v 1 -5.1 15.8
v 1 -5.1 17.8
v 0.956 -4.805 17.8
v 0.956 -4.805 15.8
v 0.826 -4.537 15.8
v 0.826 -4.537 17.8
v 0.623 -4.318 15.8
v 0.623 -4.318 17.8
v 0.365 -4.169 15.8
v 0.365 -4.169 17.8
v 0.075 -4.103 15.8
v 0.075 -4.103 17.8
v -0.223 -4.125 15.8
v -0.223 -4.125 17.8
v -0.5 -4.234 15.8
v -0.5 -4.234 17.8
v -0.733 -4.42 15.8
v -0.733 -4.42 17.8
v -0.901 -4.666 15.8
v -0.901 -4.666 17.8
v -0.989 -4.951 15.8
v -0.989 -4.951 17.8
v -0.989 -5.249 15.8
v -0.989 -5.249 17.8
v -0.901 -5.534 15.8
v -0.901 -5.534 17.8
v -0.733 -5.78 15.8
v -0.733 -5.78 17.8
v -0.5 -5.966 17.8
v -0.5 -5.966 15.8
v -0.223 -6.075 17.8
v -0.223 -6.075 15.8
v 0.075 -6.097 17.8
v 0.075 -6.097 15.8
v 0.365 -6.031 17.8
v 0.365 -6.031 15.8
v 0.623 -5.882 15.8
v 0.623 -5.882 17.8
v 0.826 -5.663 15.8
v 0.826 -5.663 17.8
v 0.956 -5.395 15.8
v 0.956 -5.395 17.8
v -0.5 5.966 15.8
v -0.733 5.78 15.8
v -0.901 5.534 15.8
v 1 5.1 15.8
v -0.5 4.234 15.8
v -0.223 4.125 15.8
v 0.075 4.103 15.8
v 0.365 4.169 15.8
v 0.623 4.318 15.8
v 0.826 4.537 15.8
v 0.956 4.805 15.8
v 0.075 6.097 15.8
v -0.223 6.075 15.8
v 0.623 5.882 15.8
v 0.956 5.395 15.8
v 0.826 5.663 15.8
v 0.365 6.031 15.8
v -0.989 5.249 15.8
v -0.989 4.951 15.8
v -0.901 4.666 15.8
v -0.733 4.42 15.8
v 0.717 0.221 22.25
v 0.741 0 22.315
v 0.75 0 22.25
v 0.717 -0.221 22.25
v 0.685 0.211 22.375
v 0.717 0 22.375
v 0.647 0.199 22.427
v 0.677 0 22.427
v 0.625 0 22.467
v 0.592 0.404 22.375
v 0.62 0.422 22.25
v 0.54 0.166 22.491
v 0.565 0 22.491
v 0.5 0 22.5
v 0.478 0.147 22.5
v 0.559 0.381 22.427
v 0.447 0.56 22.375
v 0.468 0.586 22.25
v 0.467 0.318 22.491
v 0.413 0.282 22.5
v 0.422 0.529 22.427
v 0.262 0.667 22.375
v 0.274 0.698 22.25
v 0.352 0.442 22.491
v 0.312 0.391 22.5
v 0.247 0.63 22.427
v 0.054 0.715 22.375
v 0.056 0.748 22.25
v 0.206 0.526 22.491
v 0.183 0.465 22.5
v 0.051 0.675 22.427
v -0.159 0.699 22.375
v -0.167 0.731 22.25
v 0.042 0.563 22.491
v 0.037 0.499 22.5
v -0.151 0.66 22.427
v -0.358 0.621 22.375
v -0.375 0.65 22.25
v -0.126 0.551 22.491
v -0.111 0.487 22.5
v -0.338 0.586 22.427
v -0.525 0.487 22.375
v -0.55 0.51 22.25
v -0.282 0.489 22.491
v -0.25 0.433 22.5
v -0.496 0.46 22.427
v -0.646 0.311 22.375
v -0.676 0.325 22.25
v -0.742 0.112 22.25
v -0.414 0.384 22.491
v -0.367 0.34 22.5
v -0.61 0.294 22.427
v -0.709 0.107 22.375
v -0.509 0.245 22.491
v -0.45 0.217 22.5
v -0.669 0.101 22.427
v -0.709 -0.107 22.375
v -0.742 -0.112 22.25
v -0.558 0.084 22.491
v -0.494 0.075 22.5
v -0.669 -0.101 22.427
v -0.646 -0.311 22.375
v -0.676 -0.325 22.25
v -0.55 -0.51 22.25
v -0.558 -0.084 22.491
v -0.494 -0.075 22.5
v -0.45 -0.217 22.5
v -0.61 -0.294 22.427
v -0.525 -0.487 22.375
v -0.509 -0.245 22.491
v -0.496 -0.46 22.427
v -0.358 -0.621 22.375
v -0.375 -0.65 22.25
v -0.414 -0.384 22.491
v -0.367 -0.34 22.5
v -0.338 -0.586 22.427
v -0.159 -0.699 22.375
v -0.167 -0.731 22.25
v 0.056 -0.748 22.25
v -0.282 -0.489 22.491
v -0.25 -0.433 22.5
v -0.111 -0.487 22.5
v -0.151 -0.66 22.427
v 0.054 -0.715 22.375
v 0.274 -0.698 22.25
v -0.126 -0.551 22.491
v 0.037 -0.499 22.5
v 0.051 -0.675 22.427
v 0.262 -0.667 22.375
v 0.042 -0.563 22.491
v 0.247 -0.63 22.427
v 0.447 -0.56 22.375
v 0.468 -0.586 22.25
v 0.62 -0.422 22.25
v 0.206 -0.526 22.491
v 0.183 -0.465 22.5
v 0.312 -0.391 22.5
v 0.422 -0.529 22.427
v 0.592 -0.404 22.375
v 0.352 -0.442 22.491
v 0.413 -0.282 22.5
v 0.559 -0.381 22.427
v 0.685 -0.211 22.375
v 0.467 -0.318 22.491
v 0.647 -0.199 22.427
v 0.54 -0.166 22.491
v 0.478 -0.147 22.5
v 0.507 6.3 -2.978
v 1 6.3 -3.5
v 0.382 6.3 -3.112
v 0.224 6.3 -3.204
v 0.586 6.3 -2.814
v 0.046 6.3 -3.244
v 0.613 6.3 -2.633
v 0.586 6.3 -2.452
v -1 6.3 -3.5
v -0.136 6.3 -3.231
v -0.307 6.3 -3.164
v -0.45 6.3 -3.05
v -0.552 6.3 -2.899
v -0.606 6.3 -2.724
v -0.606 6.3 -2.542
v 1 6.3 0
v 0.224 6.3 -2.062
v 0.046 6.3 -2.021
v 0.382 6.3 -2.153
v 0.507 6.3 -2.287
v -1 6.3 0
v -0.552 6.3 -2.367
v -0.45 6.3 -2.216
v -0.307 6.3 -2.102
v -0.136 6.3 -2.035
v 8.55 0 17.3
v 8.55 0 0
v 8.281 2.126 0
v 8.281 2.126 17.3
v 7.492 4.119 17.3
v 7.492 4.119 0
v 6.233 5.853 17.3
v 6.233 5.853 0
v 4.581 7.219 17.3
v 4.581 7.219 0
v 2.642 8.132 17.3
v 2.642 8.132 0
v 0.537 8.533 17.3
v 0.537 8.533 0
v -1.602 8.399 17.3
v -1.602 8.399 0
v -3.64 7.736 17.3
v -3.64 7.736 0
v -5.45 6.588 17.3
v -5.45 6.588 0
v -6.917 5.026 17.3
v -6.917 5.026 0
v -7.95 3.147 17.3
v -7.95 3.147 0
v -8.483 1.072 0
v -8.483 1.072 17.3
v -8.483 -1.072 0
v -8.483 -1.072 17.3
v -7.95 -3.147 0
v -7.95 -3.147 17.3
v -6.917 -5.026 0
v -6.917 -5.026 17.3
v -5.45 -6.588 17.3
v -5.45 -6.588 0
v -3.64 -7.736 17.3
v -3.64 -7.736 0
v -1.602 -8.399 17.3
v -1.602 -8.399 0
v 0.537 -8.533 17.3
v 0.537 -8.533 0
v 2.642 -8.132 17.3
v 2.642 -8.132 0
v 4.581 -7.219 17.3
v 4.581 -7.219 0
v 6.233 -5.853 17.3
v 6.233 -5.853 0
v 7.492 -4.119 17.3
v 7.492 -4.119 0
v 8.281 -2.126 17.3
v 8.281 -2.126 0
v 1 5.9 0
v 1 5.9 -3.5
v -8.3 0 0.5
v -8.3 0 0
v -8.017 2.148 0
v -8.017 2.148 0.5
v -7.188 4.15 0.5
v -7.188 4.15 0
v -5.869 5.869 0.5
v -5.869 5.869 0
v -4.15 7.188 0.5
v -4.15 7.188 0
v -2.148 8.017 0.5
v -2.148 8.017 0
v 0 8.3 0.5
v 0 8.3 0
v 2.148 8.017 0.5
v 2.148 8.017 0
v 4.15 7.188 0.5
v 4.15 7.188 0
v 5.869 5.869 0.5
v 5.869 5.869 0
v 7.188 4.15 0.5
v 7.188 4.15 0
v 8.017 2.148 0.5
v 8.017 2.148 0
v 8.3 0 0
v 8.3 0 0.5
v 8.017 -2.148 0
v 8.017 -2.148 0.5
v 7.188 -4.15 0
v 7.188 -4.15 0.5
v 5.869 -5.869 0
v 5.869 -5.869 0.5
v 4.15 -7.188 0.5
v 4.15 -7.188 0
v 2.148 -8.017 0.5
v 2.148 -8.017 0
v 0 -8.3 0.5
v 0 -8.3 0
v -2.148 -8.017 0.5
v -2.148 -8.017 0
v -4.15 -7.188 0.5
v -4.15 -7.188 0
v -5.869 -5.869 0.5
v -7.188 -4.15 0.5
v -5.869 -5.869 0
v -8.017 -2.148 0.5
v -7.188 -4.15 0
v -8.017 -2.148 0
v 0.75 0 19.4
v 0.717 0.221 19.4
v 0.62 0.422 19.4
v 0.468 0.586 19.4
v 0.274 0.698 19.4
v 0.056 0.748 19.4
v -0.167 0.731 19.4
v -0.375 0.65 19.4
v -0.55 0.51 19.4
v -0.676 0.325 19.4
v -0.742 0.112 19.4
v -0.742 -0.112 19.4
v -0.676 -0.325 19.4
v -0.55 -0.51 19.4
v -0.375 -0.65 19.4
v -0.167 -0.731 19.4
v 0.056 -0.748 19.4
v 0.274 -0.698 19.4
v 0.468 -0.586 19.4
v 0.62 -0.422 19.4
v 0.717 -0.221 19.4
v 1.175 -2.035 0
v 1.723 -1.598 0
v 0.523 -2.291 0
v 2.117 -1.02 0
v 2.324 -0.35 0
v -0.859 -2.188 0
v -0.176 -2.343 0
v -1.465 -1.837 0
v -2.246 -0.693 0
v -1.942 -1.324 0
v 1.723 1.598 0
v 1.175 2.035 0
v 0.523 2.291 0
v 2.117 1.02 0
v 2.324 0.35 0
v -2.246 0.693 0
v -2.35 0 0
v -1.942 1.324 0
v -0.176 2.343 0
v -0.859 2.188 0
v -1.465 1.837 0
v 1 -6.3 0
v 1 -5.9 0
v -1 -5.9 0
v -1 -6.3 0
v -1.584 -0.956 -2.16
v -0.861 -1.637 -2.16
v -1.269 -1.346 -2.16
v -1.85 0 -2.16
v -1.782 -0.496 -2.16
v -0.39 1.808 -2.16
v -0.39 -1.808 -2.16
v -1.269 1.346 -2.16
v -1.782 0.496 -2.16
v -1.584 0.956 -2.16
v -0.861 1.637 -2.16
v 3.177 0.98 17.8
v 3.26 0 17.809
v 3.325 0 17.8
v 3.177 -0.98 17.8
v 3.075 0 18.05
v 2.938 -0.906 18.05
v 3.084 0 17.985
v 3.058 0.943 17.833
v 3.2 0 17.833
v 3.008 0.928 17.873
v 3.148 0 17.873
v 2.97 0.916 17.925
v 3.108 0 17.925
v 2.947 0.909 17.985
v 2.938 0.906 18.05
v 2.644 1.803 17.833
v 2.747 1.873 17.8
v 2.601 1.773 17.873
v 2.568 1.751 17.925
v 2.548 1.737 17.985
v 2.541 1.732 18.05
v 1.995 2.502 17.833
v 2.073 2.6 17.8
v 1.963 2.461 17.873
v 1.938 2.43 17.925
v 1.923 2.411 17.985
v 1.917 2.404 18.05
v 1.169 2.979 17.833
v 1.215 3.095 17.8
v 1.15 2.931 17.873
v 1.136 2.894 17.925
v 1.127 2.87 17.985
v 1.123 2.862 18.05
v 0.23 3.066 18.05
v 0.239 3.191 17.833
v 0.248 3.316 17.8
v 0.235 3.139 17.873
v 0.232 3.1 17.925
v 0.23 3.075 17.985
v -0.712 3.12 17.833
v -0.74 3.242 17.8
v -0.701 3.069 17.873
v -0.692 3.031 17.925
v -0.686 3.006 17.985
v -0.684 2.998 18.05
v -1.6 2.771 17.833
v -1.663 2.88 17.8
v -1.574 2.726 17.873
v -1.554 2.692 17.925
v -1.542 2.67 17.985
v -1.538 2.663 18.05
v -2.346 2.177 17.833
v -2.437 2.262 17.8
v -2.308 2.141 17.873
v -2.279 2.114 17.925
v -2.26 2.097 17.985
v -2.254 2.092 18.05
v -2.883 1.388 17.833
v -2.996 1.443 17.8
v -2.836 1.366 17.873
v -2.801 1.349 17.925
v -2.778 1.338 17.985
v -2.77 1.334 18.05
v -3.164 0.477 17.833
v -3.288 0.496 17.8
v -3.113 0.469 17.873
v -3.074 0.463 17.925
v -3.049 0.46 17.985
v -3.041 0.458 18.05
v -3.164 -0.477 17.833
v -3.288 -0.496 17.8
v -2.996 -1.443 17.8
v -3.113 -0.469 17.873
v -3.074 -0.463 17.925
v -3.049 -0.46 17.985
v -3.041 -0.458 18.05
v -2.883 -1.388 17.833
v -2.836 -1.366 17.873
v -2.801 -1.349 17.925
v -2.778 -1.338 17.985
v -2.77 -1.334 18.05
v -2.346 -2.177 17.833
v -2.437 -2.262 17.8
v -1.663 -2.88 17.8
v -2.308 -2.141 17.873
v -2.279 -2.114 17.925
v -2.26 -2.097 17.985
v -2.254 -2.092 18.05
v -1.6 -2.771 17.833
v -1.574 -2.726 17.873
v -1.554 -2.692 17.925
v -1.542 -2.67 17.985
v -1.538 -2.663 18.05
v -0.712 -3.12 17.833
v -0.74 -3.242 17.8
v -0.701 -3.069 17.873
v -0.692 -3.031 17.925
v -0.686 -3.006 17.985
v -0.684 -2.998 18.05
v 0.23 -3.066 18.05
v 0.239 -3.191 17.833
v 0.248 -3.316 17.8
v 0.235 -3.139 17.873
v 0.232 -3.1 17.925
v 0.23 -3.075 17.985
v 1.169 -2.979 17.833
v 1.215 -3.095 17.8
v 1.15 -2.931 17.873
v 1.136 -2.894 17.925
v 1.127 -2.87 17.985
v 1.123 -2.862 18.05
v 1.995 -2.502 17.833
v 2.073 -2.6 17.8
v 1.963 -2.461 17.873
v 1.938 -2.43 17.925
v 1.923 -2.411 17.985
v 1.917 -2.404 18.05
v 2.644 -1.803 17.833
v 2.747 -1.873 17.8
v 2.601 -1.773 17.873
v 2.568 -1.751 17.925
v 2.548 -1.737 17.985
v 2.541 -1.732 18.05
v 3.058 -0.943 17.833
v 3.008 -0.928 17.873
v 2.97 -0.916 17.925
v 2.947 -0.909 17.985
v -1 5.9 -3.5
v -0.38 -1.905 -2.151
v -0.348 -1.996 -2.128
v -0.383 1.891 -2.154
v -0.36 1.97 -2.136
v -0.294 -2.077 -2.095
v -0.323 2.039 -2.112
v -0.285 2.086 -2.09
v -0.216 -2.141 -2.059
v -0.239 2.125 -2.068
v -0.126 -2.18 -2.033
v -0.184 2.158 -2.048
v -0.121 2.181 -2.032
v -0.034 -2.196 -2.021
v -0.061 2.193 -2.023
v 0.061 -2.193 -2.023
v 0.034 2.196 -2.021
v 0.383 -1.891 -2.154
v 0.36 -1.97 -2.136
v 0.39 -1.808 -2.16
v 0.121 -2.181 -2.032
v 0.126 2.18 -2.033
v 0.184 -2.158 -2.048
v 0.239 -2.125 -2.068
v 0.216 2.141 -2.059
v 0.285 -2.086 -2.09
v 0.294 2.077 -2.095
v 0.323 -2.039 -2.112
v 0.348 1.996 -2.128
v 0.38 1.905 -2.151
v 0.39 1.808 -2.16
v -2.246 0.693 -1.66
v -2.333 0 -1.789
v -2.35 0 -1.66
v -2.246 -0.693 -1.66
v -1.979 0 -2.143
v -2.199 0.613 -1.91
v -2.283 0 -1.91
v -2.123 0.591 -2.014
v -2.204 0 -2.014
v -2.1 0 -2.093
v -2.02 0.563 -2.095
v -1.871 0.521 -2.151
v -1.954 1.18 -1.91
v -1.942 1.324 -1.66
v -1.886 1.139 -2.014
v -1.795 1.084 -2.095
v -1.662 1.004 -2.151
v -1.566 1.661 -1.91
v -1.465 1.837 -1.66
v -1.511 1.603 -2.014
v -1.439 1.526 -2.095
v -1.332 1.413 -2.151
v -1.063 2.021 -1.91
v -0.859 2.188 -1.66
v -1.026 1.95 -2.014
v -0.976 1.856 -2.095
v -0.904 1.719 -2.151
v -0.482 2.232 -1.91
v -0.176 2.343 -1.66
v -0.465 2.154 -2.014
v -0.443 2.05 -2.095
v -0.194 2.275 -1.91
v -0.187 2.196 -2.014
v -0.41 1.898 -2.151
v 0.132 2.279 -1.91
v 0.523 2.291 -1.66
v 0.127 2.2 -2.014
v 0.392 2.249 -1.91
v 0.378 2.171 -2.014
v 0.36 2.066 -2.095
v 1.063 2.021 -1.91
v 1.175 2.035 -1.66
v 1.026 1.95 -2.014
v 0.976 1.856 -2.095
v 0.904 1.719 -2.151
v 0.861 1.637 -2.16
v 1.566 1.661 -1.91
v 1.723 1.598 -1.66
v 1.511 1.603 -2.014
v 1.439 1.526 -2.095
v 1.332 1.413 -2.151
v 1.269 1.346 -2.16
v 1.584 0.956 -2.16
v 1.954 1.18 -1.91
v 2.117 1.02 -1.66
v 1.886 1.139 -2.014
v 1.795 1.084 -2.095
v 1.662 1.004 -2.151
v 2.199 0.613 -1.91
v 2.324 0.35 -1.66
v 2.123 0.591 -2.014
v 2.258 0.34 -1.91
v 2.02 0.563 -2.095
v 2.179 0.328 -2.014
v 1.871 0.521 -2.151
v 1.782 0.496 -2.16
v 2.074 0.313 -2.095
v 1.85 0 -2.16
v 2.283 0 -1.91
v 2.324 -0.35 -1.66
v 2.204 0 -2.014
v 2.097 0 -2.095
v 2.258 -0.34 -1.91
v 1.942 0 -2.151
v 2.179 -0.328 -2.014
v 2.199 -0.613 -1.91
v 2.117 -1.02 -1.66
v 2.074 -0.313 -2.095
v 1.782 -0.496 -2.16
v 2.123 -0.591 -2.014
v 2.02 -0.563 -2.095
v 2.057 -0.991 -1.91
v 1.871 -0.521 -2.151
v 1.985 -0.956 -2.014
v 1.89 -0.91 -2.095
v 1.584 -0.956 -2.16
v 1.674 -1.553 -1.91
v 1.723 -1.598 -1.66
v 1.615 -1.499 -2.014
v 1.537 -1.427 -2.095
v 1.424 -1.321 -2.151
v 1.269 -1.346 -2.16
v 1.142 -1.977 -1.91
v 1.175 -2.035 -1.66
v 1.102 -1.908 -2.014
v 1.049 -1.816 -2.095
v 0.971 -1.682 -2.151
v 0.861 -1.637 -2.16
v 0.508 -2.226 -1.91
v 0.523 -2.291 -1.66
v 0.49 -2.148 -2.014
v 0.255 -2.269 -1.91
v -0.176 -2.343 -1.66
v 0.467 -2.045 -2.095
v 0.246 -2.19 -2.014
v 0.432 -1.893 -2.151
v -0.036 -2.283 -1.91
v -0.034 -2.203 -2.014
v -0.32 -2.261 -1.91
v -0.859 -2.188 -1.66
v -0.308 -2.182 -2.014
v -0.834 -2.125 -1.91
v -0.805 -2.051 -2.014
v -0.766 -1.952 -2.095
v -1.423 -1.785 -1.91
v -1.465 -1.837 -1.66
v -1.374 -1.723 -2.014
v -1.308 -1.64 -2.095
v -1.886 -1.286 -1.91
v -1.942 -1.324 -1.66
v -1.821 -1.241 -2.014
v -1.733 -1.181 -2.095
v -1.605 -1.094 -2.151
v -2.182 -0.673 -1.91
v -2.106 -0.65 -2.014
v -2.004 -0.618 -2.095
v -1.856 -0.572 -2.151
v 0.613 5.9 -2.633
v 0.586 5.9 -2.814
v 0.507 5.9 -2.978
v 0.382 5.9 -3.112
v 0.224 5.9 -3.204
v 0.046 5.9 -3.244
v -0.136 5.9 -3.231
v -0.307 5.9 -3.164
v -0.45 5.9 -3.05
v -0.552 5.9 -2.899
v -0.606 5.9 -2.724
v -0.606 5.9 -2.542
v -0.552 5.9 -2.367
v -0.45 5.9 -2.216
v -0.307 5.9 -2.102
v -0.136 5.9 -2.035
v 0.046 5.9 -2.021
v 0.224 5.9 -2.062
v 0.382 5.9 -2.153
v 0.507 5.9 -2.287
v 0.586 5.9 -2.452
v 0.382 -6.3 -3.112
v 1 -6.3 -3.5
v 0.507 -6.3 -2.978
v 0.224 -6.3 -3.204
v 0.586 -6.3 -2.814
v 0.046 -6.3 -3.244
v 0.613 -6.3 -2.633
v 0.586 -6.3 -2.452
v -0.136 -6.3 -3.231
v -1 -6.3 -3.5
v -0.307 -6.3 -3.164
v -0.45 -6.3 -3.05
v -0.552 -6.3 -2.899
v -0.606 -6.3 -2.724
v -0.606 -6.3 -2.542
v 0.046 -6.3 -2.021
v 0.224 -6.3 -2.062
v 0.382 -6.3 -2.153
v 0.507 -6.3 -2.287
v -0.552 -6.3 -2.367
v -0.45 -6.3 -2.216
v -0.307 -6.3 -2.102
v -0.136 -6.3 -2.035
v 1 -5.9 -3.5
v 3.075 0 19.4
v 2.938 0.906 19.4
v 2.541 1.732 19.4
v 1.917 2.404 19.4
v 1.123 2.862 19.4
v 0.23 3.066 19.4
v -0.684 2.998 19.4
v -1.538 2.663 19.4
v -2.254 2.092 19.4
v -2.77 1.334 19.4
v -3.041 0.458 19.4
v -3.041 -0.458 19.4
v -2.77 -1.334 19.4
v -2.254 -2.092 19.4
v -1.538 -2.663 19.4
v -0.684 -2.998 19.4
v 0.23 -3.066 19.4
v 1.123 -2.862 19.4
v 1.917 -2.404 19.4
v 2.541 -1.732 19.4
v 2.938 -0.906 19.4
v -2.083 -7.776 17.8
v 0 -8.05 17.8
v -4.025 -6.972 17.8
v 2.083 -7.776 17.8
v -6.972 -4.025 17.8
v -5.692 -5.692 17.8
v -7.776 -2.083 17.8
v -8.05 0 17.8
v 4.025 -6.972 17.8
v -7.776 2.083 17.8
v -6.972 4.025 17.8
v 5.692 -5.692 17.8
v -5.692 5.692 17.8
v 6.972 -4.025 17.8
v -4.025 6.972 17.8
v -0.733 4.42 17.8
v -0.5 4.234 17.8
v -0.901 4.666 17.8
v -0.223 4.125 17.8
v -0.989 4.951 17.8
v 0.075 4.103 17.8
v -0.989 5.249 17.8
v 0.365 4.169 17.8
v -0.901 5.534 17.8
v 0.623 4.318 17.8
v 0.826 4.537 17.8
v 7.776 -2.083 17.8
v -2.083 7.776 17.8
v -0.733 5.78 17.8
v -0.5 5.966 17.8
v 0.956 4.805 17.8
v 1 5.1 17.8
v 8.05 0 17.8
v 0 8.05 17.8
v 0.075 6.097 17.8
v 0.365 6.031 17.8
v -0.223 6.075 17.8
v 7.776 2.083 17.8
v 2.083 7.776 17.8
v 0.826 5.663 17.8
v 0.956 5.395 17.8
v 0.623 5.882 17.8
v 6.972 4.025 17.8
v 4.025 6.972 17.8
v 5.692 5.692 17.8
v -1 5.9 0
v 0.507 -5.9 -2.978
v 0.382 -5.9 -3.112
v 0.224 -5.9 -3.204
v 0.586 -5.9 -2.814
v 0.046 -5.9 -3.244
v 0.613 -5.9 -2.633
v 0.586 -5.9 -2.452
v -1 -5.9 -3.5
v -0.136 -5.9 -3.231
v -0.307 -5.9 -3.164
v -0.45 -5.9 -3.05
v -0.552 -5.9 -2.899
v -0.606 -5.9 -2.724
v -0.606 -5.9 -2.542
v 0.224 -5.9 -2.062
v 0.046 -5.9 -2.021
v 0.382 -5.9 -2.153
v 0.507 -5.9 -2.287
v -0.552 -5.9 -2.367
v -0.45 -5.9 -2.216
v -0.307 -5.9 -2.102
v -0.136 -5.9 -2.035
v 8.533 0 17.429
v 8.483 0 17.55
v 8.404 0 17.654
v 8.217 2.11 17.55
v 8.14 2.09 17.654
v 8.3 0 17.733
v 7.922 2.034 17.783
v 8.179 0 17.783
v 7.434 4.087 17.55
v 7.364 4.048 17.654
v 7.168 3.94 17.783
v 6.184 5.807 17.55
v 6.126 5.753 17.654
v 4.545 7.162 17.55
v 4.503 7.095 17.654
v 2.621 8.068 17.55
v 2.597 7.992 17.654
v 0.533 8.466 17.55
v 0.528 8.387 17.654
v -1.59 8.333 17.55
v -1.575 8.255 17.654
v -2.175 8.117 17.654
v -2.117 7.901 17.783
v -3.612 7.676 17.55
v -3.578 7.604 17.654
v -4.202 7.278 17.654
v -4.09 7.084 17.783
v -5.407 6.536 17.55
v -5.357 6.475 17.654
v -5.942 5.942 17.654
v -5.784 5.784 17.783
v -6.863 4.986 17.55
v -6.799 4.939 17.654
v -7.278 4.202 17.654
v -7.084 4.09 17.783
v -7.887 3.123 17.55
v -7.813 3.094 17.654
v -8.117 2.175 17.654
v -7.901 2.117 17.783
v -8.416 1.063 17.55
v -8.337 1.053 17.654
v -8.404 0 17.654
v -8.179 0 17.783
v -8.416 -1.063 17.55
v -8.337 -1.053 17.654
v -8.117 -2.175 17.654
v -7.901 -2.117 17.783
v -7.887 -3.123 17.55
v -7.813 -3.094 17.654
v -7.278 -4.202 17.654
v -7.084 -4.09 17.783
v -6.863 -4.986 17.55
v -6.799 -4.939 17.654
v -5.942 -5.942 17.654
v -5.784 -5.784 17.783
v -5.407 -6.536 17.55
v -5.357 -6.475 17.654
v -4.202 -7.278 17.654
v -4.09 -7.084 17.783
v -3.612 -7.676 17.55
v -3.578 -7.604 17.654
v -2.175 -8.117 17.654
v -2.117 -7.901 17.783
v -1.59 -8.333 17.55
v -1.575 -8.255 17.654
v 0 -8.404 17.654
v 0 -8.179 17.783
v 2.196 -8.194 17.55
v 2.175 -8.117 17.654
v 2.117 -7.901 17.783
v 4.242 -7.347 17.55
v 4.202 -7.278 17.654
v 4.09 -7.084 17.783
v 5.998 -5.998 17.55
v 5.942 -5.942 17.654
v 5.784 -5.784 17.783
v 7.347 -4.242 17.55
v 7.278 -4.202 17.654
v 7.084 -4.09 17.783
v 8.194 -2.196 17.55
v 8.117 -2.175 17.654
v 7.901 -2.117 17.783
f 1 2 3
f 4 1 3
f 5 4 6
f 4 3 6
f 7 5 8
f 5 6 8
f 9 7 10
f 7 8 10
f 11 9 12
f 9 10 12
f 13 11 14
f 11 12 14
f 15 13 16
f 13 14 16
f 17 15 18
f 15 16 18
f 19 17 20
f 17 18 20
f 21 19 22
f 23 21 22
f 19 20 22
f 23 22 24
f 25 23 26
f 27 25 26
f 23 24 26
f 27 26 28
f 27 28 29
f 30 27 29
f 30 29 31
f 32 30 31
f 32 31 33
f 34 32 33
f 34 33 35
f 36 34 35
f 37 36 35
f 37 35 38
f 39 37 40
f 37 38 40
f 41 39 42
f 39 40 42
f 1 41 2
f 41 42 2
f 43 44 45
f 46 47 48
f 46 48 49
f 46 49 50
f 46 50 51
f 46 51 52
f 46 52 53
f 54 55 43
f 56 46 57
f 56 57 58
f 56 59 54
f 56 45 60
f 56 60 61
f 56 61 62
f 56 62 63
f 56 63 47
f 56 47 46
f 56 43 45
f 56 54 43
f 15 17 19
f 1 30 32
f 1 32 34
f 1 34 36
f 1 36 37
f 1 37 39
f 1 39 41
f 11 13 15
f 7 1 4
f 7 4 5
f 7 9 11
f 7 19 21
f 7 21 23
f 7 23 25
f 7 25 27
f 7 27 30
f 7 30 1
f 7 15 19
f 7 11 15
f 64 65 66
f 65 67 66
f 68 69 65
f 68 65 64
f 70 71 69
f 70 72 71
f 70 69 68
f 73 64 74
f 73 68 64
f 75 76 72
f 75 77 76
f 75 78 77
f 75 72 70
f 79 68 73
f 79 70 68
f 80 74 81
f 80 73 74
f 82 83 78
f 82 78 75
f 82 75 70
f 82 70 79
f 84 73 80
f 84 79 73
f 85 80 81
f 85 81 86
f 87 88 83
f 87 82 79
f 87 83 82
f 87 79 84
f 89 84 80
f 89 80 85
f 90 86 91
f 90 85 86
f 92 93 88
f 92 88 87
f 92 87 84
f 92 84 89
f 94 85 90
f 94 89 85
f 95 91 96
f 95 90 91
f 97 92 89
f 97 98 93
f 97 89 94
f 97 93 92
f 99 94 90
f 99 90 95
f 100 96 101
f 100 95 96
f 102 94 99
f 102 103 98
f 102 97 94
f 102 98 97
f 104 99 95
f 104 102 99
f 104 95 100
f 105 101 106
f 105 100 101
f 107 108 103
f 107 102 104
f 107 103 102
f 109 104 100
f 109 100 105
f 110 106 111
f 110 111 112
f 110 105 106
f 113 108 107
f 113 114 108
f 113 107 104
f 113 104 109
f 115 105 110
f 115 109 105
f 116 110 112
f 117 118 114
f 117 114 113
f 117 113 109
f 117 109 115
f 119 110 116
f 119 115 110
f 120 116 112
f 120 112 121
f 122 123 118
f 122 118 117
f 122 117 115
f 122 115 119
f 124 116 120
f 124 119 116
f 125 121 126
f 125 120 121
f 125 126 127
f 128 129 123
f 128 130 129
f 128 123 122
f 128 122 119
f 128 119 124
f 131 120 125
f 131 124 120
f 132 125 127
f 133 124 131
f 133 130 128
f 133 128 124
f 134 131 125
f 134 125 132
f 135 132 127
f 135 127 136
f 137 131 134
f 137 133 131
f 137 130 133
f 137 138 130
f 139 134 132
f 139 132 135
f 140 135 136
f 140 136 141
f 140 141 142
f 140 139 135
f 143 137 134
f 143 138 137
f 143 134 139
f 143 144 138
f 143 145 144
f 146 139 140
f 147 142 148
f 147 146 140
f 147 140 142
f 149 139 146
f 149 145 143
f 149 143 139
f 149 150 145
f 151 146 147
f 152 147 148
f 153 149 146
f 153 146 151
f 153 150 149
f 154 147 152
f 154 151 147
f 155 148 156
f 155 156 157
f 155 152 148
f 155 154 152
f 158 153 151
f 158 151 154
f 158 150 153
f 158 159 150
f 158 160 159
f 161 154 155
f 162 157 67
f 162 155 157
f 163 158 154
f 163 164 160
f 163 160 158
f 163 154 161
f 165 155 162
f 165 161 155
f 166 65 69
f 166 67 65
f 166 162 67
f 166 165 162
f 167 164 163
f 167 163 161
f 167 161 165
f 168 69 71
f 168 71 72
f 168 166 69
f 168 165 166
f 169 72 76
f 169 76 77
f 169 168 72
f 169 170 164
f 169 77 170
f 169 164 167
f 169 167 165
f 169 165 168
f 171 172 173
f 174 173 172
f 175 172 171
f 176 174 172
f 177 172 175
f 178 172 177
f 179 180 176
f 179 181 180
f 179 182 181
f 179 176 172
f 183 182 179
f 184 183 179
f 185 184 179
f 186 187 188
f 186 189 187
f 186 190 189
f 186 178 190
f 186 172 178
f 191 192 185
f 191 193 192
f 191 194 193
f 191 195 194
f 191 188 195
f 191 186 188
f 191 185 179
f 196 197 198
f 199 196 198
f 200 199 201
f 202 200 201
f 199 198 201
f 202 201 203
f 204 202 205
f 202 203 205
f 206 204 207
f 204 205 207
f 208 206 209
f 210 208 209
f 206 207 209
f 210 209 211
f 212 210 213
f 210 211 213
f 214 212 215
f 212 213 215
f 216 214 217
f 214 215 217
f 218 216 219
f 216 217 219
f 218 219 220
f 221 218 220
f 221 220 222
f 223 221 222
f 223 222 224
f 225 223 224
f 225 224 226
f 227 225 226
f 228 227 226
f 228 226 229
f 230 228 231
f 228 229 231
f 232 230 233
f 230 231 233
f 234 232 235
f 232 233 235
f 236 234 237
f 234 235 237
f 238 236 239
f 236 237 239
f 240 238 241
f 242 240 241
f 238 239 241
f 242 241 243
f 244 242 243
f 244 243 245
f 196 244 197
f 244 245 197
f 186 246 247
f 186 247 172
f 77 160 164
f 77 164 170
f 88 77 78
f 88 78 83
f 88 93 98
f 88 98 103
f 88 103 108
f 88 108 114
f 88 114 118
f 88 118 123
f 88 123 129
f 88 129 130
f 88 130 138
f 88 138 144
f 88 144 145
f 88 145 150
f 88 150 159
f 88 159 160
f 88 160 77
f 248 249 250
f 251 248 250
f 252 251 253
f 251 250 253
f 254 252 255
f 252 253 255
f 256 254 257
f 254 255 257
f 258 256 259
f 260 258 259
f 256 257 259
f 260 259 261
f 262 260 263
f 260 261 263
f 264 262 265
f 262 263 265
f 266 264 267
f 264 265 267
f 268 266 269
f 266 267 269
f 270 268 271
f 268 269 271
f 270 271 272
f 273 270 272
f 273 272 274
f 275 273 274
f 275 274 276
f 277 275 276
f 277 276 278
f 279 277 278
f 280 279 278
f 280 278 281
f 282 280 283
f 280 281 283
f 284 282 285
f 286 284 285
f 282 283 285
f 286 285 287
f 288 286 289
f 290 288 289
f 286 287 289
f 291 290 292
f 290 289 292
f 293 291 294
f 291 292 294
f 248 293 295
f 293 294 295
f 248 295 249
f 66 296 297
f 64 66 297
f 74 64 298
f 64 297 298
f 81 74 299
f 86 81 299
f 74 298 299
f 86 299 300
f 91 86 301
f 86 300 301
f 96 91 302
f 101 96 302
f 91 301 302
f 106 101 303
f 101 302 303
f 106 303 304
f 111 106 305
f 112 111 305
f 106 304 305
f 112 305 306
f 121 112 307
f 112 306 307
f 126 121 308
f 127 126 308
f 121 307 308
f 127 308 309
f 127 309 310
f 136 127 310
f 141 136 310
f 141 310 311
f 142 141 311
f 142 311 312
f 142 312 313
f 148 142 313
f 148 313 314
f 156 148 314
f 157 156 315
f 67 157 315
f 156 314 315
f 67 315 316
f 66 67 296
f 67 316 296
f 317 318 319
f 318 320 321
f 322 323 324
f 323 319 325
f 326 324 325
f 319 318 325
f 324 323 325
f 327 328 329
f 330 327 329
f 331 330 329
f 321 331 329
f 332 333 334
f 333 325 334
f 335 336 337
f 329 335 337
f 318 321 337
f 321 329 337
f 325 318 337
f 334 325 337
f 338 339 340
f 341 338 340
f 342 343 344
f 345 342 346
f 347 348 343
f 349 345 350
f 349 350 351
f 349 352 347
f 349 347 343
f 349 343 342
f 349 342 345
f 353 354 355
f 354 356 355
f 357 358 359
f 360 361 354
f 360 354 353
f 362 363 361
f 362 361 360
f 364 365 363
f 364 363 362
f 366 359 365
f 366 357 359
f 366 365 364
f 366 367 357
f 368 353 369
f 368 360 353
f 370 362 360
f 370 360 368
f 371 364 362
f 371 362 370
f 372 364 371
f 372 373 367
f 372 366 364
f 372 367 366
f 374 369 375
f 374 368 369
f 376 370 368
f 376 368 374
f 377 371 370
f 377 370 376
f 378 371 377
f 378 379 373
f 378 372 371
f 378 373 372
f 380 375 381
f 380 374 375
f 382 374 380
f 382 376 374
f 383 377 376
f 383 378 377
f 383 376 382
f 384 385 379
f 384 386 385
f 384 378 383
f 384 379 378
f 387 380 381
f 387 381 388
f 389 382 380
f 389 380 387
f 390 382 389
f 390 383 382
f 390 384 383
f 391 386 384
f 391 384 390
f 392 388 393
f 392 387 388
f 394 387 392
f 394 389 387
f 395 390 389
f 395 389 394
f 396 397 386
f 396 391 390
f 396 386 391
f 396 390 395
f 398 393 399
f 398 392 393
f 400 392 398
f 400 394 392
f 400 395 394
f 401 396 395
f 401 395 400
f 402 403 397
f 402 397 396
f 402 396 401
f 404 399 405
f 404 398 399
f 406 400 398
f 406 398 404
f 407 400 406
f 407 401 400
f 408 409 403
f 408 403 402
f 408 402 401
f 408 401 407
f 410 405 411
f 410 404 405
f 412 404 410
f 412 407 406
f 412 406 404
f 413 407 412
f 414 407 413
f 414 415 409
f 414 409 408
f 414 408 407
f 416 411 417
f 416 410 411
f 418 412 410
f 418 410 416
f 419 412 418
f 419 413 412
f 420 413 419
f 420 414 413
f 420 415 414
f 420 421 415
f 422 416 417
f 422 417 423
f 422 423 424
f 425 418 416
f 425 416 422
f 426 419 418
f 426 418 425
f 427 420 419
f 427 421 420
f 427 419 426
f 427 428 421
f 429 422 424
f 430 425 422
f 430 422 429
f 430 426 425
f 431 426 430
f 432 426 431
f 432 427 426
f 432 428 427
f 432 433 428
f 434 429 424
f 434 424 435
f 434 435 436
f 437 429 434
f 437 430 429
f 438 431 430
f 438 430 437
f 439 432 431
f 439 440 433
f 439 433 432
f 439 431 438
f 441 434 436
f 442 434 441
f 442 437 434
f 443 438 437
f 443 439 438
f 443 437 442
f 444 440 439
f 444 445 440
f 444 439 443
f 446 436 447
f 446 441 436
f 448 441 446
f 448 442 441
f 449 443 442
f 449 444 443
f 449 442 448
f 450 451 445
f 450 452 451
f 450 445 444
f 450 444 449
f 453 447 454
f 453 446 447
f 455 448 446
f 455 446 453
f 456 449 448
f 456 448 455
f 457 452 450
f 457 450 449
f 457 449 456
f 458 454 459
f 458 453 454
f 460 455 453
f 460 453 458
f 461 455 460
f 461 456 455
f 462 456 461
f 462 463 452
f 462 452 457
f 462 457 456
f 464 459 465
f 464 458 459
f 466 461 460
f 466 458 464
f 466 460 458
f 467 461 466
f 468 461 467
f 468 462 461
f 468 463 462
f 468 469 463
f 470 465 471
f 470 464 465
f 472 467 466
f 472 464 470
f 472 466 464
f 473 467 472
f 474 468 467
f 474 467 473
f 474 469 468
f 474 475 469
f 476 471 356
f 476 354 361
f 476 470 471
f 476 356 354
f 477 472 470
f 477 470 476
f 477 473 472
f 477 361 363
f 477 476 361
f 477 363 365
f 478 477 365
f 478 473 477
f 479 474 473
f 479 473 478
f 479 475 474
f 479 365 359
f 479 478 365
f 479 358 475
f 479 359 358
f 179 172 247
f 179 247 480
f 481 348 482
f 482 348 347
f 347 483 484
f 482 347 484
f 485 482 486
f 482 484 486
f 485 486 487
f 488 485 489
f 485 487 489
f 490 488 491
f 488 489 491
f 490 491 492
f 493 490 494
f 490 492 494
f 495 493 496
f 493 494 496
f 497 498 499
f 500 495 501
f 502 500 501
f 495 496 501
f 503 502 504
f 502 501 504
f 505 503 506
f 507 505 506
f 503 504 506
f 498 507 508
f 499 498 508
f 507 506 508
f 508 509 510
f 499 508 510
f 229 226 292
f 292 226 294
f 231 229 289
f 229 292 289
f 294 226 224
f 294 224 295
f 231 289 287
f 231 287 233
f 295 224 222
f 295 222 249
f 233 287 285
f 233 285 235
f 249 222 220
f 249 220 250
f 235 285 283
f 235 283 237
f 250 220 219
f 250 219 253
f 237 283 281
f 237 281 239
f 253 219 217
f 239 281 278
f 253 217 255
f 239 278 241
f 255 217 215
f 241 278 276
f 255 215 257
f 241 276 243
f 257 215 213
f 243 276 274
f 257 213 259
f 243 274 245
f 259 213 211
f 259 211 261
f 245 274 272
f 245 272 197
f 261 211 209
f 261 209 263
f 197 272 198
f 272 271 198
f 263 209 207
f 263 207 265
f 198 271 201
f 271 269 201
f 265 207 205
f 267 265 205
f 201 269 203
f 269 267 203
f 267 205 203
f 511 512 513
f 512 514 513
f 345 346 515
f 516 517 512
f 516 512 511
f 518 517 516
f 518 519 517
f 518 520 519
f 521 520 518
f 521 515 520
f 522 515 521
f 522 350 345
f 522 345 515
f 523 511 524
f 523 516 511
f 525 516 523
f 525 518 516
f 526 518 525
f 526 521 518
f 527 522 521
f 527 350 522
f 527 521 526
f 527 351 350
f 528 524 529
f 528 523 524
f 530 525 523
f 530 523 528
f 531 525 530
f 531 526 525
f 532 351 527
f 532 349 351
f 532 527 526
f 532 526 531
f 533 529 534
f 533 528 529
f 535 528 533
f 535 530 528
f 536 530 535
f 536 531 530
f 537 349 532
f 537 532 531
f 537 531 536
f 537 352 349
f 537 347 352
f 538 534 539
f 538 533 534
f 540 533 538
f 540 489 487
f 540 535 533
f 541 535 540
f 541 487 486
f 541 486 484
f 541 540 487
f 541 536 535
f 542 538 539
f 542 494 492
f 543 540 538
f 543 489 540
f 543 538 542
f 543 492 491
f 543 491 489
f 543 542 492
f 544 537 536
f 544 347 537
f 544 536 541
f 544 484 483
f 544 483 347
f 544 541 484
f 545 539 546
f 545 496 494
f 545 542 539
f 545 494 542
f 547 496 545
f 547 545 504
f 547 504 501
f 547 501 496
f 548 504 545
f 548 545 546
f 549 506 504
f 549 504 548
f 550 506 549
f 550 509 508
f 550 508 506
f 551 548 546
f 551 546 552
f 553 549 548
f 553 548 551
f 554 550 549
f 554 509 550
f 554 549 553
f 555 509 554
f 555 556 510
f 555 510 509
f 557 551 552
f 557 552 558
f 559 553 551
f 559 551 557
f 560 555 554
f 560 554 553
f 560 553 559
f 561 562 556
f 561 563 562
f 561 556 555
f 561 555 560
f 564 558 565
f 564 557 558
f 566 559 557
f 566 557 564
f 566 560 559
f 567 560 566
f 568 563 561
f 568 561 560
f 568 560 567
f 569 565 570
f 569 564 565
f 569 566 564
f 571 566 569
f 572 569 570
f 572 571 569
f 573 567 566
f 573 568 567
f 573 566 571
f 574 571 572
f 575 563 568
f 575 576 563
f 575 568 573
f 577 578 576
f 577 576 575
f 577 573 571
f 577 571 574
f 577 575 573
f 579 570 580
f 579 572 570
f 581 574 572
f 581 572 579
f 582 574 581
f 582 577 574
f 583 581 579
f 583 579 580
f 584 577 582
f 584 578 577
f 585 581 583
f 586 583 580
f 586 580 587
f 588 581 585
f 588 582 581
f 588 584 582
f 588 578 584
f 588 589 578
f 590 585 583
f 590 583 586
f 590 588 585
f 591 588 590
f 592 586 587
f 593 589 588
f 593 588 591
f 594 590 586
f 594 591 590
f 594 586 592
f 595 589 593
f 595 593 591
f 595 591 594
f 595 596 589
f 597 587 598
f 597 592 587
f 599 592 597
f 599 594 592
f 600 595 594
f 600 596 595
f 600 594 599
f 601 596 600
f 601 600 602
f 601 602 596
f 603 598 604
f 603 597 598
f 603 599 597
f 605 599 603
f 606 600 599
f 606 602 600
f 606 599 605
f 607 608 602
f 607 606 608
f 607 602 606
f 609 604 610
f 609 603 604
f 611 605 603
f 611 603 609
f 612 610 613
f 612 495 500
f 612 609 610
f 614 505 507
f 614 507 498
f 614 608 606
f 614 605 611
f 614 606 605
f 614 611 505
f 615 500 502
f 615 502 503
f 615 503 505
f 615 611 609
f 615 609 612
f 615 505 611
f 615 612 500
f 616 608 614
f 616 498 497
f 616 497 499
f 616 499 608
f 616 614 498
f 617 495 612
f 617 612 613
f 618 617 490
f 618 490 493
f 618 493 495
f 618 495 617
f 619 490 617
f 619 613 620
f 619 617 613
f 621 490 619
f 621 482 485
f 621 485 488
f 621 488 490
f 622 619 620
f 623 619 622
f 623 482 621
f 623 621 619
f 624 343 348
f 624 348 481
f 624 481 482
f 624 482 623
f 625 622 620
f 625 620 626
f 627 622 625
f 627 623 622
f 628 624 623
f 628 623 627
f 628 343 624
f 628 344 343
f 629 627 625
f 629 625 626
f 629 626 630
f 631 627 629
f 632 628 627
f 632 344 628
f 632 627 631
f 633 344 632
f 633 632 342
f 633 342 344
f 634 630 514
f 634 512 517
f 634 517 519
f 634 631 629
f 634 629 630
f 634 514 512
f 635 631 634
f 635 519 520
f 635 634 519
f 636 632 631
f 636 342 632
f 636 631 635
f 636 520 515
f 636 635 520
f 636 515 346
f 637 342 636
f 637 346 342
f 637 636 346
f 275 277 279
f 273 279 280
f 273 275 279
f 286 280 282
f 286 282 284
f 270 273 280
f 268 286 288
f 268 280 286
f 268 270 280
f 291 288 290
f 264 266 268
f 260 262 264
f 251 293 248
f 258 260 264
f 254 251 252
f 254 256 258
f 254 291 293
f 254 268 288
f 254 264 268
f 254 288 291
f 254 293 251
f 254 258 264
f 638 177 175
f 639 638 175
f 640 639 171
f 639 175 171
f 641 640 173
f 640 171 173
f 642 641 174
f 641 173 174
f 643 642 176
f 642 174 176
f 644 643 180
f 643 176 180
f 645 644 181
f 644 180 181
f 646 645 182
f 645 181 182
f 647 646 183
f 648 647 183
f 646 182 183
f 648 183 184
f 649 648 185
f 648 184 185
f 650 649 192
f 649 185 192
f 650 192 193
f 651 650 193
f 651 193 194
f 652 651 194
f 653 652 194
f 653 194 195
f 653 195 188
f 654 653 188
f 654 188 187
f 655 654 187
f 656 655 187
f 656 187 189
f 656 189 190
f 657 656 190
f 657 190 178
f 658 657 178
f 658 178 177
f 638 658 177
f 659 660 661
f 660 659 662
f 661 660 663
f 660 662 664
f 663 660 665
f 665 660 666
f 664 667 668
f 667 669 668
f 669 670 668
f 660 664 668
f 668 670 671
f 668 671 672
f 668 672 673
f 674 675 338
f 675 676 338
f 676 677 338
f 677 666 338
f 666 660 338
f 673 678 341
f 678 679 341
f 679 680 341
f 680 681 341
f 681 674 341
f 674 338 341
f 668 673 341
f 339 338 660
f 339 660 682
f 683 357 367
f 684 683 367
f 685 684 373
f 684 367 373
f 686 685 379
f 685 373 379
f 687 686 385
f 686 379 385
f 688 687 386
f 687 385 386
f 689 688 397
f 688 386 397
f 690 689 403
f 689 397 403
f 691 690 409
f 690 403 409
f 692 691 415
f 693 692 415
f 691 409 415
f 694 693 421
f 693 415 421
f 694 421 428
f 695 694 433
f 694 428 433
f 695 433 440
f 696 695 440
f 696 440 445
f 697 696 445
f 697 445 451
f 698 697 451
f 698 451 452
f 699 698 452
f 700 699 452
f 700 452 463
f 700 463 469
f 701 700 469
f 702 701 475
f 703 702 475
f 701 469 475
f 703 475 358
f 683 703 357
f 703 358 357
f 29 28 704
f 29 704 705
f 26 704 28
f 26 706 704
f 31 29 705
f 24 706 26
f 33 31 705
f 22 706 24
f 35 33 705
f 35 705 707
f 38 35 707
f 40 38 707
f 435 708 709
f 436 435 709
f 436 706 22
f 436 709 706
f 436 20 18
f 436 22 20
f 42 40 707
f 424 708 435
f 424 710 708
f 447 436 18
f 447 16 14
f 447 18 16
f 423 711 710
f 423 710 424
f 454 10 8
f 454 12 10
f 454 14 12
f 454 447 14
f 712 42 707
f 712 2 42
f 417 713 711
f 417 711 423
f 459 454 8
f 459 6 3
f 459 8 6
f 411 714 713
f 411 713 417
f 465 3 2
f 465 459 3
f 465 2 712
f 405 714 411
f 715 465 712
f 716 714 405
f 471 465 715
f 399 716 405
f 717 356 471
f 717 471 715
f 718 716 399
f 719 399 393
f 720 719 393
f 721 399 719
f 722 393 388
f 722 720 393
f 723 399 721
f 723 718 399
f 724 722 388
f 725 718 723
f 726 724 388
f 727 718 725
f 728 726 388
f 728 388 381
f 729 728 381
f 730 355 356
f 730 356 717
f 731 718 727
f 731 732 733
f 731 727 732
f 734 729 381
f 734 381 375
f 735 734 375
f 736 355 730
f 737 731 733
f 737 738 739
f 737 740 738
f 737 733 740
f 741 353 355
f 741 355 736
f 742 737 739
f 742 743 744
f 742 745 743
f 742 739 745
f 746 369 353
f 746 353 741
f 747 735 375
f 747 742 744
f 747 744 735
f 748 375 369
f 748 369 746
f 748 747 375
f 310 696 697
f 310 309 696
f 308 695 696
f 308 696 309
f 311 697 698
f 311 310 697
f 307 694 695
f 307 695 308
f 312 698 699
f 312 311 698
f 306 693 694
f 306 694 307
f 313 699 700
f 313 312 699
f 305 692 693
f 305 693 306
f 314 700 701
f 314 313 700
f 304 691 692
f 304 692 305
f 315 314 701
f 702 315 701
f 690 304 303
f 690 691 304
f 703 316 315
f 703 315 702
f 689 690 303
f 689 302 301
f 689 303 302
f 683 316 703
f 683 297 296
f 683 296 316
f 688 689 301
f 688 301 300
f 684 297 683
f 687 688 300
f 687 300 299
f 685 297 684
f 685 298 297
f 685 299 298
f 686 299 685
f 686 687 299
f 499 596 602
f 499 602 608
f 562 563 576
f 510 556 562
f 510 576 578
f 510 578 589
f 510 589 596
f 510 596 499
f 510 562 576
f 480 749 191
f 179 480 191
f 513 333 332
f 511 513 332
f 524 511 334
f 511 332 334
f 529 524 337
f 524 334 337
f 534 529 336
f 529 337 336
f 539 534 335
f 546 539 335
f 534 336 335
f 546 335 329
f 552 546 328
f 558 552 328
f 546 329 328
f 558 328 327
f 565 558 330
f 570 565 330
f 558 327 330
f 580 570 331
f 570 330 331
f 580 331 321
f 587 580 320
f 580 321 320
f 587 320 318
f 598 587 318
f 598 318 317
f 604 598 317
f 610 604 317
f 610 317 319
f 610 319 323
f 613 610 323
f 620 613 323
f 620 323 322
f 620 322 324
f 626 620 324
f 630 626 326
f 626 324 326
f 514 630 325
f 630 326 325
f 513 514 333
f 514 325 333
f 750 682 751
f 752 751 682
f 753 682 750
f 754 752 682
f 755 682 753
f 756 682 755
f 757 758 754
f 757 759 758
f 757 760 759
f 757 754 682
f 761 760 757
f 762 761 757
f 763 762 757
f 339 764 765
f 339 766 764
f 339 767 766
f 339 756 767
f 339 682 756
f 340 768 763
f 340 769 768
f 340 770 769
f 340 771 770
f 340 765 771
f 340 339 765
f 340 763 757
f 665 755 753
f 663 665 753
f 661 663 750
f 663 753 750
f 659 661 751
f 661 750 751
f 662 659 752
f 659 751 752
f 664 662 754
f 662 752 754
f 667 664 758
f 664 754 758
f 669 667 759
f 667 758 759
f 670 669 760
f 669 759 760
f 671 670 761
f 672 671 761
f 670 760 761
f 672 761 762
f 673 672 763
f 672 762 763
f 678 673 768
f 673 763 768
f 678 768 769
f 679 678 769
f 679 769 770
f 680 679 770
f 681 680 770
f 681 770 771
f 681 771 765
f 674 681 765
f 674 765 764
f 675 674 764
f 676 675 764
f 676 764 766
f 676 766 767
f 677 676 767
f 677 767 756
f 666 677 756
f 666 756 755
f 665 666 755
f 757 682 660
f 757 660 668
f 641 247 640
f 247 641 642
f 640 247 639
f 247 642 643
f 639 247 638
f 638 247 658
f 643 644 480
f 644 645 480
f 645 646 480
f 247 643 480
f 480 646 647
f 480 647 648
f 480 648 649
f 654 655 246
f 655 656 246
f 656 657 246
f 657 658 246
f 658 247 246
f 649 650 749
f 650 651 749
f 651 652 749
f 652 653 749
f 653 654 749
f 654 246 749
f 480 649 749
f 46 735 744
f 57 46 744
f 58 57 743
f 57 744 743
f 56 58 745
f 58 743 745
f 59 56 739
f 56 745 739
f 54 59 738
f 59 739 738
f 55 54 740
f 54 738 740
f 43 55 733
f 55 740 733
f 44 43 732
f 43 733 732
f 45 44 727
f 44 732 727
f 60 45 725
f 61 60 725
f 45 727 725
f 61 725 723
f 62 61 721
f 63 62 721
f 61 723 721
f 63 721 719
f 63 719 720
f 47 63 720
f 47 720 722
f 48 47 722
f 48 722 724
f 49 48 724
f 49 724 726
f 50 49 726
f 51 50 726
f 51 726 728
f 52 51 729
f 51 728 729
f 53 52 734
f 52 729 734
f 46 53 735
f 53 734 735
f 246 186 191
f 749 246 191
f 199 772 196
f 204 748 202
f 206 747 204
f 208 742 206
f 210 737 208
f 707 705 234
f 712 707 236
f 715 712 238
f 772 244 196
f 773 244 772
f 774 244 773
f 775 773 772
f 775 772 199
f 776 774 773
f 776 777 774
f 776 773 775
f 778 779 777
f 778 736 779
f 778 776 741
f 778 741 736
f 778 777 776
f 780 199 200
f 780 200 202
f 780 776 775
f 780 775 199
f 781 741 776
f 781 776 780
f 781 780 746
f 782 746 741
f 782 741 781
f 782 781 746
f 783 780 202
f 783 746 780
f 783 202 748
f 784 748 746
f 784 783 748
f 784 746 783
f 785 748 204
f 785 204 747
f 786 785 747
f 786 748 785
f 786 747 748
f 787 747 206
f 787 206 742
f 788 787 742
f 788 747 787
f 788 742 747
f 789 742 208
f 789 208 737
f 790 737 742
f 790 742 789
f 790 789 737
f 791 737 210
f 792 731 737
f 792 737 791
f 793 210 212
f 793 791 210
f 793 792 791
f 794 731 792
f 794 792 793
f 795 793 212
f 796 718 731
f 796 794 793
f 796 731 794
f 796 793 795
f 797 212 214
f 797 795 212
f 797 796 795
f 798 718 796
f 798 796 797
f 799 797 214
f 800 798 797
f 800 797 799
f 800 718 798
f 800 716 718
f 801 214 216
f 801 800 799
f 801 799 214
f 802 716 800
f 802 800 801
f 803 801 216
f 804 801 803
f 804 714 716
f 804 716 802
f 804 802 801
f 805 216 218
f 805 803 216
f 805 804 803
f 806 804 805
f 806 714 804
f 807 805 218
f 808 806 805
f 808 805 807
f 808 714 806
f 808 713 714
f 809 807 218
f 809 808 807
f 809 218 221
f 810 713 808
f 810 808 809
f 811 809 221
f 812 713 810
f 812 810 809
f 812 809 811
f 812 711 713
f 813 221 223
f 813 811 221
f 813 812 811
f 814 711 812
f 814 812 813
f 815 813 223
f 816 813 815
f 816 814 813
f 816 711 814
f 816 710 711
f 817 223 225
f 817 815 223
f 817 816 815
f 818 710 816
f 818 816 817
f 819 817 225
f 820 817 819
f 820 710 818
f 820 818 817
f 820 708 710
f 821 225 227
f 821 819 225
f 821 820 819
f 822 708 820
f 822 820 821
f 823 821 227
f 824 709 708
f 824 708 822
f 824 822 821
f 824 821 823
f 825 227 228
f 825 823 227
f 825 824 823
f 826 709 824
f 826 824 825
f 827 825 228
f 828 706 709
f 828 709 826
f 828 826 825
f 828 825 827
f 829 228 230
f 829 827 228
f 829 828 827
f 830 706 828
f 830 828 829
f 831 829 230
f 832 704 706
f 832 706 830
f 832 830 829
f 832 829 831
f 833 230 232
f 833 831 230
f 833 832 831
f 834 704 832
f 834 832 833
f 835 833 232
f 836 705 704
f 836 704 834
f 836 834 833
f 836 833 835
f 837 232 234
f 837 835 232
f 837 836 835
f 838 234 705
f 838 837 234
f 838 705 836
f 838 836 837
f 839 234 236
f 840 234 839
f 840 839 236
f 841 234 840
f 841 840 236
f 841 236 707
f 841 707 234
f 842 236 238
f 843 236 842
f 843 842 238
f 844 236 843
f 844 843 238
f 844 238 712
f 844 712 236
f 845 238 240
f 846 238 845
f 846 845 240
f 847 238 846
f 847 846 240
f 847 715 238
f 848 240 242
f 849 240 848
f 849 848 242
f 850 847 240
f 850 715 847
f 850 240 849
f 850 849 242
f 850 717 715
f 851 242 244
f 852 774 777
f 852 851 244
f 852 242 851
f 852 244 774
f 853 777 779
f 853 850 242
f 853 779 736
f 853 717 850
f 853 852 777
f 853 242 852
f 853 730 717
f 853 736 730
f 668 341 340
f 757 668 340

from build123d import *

# Parameters (mm, degrees)
SKETCH1_R           = 8.55
BOSS_EXTRUDE1_DEPTH = 17.8
SKETCH2_R           = 3.075
BOSS_EXTRUDE2_DEPTH = 1.6
SKETCH3_R           = 0.75
BOSS_EXTRUDE3_DEPTH = 3.1
SKETCH4_R           = 1
CUT_EXTRUDE1_DEPTH  = 2
SKETCH5_R           = 2.35
BOSS_EXTRUDE4_DEPTH = 2.16
SKETCH6_W           = 2
SKETCH6_H           = 0.4
BOSS_EXTRUDE5_DEPTH = 3.5
FILLET1_R           = 0.5
FILLET2_R           = 0.25
FILLET3_R           = 0.5
SKETCH7_R           = 8.3
CUT_EXTRUDE2_DEPTH  = 0.5
SKETCH8_R           = 0.613220663
CUT_EXTRUDE3_DEPTH  = 15.5
FILLET4_R           = 0.25


with BuildPart() as part:
    # Sketch1 → Boss-Extrude1 (new body)
    with BuildSketch(Plane.XY):
        Circle(SKETCH1_R)
    extrude(amount=BOSS_EXTRUDE1_DEPTH)

    # Sketch2 → Boss-Extrude2 (add)
    with BuildSketch(Plane.XY.offset(17.8)):
        Circle(SKETCH2_R)
    extrude(amount=BOSS_EXTRUDE2_DEPTH)

    # Sketch3 → Boss-Extrude3 (add)
    with BuildSketch(Plane.XY.offset(19.4)):
        Circle(SKETCH3_R)
    extrude(amount=BOSS_EXTRUDE3_DEPTH)

    # Sketch4 → Cut-Extrude1 (cut)
    with BuildSketch(Plane.XY.offset(17.8)):
        with Locations((0, 5.1)):
            Circle(SKETCH4_R)
        with Locations((0, -5.1)):
            Circle(SKETCH4_R)
    extrude(amount=-CUT_EXTRUDE1_DEPTH, mode=Mode.SUBTRACT)

    # Sketch5 → Boss-Extrude4 (add)
    with BuildSketch(Plane(origin=(0, 0, 0), x_dir=(-1, 0, 0), z_dir=(0, 0, -1))):
        Circle(SKETCH5_R)
    extrude(amount=BOSS_EXTRUDE4_DEPTH)

    # Sketch6 → Boss-Extrude5 (add)
    with BuildSketch(Plane(origin=(0, 0, 0), x_dir=(-1, 0, 0), z_dir=(0, 0, -1))):
        with Locations((0, 6.1)):
            Rectangle(SKETCH6_W, SKETCH6_H)
        with Locations((0, -6.1)):
            Rectangle(SKETCH6_W, SKETCH6_H)
    extrude(amount=BOSS_EXTRUDE5_DEPTH)

    # Fillet1
    fillet1_edges = [part.edges().sort_by_distance(p)[0] for p in [
        (-8.55, 0, 17.8),
    ]]
    fillet(fillet1_edges, radius=FILLET1_R)

    # Fillet2
    fillet2_edges = [part.edges().sort_by_distance(p)[0] for p in [
        (-3.075, 0, 17.8),
    ]]
    fillet(fillet2_edges, radius=FILLET2_R)

    # Fillet3
    fillet3_edges = [part.edges().sort_by_distance(p)[0] for p in [
        (2.35, 0, -2.16),
    ]]
    fillet(fillet3_edges, radius=FILLET3_R)

    # Sketch7 → Cut-Extrude2 (cut)
    with BuildSketch(Plane(origin=(0, 0, 0), x_dir=(-1, 0, 0), z_dir=(0, 0, -1))):
        Circle(SKETCH7_R)
    extrude(amount=-CUT_EXTRUDE2_DEPTH, mode=Mode.SUBTRACT)

    # Sketch8 → Cut-Extrude3 (cut)
    with BuildSketch(Plane(origin=(0, 6.3, 0), x_dir=(1, 0, 0), z_dir=(0, 1, 0))):
        with Locations((0, 2.632929707)):
            Circle(SKETCH8_R)
    extrude(amount=-CUT_EXTRUDE3_DEPTH, mode=Mode.SUBTRACT)

    # Fillet4
    fillet4_edges = [part.edges().sort_by_distance(p)[0] for p in [
        (-0.75, 0, 22.5),
    ]]
    fillet(fillet4_edges, radius=FILLET4_R)


solid = part.part
